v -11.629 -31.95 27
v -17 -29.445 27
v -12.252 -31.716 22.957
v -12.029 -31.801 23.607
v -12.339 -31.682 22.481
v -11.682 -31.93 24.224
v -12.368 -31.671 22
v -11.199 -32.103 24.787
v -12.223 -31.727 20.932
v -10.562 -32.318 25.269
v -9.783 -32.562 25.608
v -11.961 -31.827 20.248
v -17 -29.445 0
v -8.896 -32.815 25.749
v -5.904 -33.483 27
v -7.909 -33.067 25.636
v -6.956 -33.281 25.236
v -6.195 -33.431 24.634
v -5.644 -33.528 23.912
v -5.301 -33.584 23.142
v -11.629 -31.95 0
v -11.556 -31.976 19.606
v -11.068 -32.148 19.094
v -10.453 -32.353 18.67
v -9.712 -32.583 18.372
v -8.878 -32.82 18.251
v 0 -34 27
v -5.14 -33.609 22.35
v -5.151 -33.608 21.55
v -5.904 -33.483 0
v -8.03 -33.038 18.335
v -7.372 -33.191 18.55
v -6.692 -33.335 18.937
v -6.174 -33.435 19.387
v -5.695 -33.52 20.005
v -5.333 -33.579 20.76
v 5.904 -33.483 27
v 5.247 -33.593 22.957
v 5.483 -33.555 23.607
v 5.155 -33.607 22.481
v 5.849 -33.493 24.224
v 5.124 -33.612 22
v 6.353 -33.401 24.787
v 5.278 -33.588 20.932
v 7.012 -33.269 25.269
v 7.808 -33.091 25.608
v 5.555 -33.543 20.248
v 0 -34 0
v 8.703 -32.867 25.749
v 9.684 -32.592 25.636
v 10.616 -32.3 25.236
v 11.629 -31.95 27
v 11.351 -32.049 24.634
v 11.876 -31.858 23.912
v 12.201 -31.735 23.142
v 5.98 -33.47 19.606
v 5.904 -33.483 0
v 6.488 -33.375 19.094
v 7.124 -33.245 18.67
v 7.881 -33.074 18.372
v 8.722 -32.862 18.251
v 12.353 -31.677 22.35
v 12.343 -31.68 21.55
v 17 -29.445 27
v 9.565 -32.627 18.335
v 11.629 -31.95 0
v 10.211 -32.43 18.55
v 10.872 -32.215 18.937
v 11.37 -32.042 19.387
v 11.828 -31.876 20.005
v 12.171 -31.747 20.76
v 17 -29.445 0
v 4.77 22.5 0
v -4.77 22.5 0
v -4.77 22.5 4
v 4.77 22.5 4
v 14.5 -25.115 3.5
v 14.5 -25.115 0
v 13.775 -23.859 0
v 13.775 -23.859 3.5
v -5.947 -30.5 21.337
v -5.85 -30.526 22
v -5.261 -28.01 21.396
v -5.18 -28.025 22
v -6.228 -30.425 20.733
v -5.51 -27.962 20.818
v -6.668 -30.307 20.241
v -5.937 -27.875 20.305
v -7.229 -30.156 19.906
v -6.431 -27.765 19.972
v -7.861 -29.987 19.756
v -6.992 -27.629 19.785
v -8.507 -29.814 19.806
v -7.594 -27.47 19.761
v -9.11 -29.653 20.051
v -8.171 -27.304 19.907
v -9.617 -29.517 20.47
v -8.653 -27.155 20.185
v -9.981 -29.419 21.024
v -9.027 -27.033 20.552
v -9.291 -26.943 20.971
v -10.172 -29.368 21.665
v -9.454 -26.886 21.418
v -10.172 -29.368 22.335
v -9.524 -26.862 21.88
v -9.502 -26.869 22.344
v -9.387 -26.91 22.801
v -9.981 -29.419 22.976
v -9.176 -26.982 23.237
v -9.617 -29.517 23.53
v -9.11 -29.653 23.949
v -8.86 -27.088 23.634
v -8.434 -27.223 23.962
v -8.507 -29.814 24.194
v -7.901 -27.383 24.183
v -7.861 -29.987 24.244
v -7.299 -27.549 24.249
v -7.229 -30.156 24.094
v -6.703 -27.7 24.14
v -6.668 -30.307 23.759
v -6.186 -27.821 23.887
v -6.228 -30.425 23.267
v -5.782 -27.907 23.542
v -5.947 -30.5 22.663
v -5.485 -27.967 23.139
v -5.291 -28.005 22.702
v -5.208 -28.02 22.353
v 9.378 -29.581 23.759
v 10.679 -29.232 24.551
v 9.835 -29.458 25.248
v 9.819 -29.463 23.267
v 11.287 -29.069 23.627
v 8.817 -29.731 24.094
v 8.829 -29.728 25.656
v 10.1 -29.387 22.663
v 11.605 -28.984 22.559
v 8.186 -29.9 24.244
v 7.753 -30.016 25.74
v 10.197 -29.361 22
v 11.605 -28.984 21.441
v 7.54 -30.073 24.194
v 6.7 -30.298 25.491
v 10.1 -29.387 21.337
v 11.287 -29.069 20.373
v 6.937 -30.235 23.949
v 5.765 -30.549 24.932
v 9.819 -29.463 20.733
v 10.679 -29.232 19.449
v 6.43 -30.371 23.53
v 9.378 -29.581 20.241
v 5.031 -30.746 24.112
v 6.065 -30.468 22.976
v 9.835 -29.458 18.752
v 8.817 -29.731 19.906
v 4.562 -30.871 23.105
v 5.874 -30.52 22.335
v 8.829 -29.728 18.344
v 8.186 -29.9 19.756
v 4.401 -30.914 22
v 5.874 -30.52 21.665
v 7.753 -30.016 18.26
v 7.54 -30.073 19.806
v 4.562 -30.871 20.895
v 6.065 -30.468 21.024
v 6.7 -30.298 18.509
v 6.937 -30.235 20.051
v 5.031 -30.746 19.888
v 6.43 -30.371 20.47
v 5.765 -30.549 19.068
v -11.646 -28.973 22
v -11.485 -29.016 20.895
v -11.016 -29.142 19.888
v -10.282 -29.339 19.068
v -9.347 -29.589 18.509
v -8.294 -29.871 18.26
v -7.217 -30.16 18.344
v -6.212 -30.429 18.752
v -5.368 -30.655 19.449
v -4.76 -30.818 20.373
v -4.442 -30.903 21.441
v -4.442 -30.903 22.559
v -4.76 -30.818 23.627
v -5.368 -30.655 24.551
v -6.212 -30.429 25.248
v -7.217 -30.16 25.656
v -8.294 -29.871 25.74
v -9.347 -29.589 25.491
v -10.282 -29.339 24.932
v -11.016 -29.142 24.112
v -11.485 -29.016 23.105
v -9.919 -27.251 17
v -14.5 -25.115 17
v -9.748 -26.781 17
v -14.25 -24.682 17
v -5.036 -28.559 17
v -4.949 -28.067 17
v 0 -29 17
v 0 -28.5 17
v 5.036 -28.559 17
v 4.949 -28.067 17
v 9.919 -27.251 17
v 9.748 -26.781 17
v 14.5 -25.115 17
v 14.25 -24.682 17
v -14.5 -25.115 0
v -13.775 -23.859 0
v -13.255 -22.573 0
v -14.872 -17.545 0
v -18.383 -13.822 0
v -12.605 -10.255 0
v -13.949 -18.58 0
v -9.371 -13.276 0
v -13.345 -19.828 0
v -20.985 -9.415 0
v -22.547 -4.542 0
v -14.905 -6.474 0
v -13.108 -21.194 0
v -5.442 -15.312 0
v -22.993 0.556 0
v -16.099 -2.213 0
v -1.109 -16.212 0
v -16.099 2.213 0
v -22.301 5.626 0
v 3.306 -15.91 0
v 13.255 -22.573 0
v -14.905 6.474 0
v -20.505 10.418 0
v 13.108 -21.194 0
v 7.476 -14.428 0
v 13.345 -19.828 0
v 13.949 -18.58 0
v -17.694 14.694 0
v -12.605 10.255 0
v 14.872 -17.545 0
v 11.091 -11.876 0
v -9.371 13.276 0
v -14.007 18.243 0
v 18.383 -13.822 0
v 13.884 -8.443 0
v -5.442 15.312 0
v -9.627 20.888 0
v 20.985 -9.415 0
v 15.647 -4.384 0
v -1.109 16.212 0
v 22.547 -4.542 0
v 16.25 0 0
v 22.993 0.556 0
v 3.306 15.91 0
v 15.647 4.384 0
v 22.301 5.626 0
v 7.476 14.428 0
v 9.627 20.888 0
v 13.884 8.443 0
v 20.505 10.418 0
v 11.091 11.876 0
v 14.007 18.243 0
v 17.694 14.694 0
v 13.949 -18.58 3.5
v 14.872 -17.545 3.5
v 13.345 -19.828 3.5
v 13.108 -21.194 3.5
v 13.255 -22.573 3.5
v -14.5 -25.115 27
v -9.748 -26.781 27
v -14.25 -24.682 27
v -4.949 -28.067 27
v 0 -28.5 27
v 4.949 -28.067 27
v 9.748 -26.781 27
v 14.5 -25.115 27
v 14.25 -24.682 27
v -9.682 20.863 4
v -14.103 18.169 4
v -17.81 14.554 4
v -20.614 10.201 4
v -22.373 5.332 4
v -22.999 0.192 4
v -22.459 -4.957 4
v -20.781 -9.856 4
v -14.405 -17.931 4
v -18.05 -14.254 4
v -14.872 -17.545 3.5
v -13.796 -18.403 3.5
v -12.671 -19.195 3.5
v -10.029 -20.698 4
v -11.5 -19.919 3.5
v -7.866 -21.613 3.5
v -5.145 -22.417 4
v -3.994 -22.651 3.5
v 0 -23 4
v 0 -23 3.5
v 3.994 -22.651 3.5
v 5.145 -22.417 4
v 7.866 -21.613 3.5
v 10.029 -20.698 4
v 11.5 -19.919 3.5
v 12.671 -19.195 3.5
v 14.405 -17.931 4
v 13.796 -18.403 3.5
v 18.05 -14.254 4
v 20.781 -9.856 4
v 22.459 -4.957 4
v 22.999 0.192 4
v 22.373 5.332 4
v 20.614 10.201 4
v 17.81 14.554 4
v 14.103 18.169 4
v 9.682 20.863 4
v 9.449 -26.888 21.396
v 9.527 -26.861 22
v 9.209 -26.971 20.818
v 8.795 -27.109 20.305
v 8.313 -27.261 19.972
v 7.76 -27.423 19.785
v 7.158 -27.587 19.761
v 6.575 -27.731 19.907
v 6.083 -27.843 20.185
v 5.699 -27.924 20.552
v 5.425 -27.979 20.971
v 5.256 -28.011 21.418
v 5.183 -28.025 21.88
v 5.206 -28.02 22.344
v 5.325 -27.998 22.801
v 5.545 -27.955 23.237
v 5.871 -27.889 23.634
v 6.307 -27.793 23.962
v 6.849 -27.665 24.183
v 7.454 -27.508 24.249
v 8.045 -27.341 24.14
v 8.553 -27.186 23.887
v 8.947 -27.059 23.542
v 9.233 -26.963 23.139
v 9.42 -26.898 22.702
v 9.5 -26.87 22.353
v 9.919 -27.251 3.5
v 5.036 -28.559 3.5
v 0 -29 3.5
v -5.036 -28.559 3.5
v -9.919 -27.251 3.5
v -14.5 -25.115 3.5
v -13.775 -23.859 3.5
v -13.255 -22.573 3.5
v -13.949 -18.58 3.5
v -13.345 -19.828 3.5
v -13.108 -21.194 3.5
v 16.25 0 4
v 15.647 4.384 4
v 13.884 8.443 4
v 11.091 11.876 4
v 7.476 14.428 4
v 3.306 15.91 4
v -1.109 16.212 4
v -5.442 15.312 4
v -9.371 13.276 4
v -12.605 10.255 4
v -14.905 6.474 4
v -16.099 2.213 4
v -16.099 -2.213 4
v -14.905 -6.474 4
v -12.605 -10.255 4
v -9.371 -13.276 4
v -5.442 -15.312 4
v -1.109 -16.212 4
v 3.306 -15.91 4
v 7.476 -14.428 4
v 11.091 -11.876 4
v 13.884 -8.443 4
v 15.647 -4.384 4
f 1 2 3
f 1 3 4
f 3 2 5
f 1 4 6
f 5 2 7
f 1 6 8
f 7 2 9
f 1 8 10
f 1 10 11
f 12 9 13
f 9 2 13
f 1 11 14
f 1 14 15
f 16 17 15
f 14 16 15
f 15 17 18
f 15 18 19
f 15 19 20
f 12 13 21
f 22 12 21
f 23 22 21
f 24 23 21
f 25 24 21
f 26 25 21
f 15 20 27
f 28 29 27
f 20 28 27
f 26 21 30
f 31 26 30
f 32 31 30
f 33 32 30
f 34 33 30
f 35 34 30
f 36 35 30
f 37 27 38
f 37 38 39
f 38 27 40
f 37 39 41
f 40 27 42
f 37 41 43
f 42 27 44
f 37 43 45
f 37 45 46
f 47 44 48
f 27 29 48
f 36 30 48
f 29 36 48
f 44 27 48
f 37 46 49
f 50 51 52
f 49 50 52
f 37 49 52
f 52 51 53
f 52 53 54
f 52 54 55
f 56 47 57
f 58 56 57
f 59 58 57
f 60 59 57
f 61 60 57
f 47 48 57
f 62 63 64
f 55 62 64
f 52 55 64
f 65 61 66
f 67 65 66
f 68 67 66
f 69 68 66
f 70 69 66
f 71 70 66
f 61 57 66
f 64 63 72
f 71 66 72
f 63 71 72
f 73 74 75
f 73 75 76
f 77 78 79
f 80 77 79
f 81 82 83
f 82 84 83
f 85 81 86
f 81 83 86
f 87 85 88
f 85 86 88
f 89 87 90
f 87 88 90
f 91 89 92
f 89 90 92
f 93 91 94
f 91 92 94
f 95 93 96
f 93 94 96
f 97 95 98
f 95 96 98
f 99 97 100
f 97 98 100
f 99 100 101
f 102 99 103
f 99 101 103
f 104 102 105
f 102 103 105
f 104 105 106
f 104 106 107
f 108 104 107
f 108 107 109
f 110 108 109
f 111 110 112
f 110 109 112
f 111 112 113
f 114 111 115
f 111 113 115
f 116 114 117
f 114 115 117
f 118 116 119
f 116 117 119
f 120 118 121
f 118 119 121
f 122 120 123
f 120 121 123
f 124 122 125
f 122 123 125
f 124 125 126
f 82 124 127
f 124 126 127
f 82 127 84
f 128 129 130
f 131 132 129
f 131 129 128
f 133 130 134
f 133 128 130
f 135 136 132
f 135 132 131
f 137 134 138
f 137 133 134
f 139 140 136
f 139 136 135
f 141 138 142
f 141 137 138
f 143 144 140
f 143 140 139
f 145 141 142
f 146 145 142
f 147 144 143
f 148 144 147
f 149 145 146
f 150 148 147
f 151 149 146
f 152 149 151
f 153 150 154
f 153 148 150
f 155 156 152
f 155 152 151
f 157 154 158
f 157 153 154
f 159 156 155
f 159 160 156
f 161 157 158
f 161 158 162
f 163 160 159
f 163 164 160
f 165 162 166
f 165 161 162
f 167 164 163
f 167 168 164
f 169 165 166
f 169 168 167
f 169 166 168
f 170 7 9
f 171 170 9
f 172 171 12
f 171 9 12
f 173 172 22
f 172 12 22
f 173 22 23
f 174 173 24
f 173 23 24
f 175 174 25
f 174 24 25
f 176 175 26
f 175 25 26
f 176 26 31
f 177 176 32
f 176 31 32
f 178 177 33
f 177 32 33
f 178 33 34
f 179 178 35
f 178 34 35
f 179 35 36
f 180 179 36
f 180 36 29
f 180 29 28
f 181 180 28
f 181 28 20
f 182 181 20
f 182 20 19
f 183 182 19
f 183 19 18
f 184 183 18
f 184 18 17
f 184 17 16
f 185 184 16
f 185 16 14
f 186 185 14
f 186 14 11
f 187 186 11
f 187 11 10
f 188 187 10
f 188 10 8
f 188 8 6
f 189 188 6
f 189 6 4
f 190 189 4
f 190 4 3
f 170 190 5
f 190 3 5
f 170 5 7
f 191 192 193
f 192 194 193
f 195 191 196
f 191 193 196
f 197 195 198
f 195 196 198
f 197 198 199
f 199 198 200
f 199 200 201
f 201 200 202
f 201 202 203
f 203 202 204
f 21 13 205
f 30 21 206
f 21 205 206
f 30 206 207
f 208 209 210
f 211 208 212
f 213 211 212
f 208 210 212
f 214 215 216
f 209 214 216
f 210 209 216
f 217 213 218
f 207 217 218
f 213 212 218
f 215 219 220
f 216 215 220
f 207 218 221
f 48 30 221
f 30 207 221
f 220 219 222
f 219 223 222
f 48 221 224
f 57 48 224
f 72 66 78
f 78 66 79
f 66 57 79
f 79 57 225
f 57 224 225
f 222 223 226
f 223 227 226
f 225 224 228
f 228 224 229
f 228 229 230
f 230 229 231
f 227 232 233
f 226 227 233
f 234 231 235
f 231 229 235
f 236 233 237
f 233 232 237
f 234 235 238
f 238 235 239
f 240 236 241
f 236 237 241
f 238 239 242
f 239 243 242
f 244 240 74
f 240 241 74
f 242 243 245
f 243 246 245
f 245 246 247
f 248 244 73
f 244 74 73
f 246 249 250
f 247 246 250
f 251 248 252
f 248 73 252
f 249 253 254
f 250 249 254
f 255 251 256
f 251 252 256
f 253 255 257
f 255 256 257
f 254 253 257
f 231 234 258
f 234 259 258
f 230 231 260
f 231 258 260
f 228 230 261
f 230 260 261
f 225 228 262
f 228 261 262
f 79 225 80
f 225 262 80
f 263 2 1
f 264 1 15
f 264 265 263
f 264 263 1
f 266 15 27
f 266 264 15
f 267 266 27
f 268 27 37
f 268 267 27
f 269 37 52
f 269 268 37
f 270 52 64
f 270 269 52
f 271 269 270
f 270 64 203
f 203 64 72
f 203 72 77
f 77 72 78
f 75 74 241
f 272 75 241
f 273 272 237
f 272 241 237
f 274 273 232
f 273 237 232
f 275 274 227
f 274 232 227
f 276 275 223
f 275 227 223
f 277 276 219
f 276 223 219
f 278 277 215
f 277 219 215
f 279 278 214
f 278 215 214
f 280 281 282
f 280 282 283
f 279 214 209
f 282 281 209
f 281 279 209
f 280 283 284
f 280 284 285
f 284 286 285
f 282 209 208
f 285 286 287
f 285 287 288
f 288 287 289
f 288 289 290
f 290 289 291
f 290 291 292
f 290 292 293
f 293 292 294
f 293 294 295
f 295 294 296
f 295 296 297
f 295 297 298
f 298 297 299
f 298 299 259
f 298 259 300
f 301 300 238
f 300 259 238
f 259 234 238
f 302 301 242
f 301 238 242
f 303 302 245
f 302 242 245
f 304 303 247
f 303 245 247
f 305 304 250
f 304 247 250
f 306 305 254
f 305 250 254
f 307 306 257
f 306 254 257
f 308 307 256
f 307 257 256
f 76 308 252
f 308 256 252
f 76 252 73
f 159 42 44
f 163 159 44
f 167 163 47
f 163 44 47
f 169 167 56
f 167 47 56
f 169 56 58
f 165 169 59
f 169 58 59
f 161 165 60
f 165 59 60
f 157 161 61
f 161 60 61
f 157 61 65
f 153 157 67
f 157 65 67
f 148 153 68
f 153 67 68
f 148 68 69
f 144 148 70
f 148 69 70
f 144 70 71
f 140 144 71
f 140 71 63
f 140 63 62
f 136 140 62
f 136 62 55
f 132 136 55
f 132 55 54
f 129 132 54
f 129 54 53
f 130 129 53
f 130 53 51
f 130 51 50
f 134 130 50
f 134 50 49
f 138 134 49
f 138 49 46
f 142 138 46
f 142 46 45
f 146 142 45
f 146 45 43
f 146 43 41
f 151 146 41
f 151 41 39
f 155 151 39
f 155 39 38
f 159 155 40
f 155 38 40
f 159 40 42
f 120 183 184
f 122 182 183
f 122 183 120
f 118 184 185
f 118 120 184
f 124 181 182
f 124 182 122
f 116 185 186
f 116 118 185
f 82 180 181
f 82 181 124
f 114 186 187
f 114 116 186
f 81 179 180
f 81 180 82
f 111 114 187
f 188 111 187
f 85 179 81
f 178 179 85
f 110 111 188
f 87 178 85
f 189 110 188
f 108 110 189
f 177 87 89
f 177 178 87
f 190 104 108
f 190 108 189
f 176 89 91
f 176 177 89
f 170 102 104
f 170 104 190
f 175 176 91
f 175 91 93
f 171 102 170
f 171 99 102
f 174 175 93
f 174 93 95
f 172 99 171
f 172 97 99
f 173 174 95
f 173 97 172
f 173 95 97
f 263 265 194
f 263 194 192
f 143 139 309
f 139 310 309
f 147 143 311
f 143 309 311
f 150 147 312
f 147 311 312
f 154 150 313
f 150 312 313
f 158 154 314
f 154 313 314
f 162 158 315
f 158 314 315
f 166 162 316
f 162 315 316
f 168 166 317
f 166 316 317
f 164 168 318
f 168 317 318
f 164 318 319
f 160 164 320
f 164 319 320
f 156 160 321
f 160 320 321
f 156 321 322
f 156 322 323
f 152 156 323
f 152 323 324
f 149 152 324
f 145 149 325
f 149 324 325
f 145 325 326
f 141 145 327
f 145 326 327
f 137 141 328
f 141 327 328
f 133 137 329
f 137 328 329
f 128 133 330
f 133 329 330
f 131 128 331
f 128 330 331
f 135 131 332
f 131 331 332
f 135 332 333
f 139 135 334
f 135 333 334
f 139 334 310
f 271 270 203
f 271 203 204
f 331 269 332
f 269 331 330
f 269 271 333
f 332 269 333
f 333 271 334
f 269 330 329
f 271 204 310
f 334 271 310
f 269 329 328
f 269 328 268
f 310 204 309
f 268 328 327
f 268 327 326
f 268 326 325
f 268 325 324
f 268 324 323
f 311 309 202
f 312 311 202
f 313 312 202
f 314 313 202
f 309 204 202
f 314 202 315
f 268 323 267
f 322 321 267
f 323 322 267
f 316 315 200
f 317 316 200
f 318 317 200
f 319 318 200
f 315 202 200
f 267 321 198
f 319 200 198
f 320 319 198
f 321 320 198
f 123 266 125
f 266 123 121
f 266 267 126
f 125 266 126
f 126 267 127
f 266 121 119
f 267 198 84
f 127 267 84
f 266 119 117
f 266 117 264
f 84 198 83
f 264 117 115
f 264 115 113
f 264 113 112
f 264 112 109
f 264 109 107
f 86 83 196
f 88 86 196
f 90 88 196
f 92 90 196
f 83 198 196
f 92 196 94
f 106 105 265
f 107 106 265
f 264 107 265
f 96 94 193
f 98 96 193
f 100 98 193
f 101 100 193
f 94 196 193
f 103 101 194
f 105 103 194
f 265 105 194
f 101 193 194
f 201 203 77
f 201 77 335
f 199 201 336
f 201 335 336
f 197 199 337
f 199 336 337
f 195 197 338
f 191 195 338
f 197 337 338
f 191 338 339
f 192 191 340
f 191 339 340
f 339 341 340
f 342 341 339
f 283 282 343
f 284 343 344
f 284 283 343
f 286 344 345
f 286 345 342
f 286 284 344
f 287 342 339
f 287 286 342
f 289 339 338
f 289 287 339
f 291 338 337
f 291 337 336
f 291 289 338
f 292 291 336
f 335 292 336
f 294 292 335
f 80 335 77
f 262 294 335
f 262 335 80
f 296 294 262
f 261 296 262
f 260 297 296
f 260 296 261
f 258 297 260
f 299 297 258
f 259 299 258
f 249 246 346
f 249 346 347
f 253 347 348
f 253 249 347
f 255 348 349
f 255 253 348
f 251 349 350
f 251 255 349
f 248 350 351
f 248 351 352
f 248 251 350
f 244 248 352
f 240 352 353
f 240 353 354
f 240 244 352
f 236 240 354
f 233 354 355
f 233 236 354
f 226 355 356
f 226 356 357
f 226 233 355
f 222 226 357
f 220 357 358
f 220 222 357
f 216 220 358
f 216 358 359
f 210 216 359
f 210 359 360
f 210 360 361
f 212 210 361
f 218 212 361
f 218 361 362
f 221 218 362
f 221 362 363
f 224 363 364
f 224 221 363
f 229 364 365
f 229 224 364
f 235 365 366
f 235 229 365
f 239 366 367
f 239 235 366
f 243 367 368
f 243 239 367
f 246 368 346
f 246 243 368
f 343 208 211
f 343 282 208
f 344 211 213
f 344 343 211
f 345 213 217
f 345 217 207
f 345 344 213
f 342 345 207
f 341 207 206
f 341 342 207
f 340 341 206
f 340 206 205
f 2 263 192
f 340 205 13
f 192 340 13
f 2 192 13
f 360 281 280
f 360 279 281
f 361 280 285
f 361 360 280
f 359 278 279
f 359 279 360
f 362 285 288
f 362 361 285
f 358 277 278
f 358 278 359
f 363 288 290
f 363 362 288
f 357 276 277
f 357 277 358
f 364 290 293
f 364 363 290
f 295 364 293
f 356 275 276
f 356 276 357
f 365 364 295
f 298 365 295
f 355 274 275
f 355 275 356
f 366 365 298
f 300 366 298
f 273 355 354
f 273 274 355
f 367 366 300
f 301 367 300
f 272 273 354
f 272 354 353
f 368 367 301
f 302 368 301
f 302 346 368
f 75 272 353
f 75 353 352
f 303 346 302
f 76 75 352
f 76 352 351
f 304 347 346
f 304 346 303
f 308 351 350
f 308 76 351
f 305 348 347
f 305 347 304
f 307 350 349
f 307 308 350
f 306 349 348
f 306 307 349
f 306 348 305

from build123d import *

# Parameters (mm, degrees)
SKETCH_1_R                          = 23
SKETCH_1_R_2                        = 16.25
EXTRUDE_1_DEPTH                     = 4
SKETCH_2_W                          = 9.539392014
SKETCH_2_H                          = 6.996470021
CUT_EXTRUDE_1_DEPTH                 = 14
EXTRUDE_2_DEPTH                     = 3.5
EXTRUDE_3_DEPTH                     = 27
FILLET_1_R                          = 5
EXTRUDE_START                       = -10
EXTRUDE_4_DEPTH                     = 10
HOLE_WIZARD_1_D                     = 4.5
HOLE_WIZARD_1_CBORE_D               = 7.5
HOLE_WIZARD_1_CBORE_DEPTH           = 3
HOLE_WIZARD_1_ON_FACE_2_D           = 4.5
HOLE_WIZARD_1_ON_FACE_2_CBORE_D     = 7.5
HOLE_WIZARD_1_ON_FACE_2_CBORE_DEPTH = 3


with BuildPart() as part:
    # 草图1 → 凸台-拉伸1 (new body)
    with BuildSketch(Plane.XY):
        Circle(SKETCH_1_R)
        Circle(SKETCH_1_R_2, mode=Mode.SUBTRACT)
    extrude(amount=EXTRUDE_1_DEPTH)

    # 草图2 → 切除-拉伸1 (cut)
    with BuildSketch(Plane.XY):
        with Locations((0, 25.998235011)):
            Rectangle(SKETCH_2_W, SKETCH_2_H)
    extrude(amount=CUT_EXTRUDE_1_DEPTH, mode=Mode.SUBTRACT)

    # 草图3 → 凸台-拉伸2 (add)
    with BuildSketch(Plane.XY):
        with BuildLine():
            Line((-11.5, -19.918584287), (-14.5, -25.11473671))
            ThreePointArc((-14.5, -25.11473671), (0, -29), (14.5, -25.11473671))
            Line((14.5, -25.11473671), (11.5, -19.918584287))
            ThreePointArc((11.5, -19.918584287), (0, -23), (-11.5, -19.918584287))
        make_face()
    extrude(amount=EXTRUDE_2_DEPTH)

    # 草图3<3> → 凸台-拉伸3 (add)
    with BuildSketch(Plane.XY):
        with BuildLine():
            ThreePointArc((14.5, -25.11473671), (0, -29), (-14.5, -25.11473671))
            Line((-14.5, -25.11473671), (-17, -29.444863729))
            ThreePointArc((-17, -29.444863729), (0, -34), (17, -29.444863729))
            Line((17, -29.444863729), (14.5, -25.11473671))
        make_face()
    extrude(amount=EXTRUDE_3_DEPTH)

    # 圆角1
    fillet_1_edges = [part.edges().sort_by_distance(p)[0] for p in [
        (-11.5, -19.918584287, 1.75),
        (11.5, -19.918584287, 1.75),
    ]]
    fillet(fillet_1_edges, radius=FILLET_1_R)

    # 草图4 → 凸台-拉伸4 (add)
    with BuildSketch(Plane.XY.offset(27).offset(EXTRUDE_START)):
        with BuildLine():
            ThreePointArc((-17, -29.444863729), (0, -34), (17, -29.444863729))
            Line((17, -29.444863729), (14.25, -24.681724008))
            ThreePointArc((14.25, -24.681724008), (0, -28.5), (-14.25, -24.681724008))
            Line((-14.25, -24.681724008), (-17, -29.444863729))
        make_face()
    extrude(amount=EXTRUDE_4_DEPTH)

    # 孔1 (through all)
    with Locations(Plane(origin=(-8.799847533, -32.841478094, 22), x_dir=(-0.965925826289, 0.258819045103, 0), z_dir=(-0.258819045103, -0.965925826289, 0))):
        with Locations((1e-09, 0)):
            CounterBoreHole(HOLE_WIZARD_1_D / 2, HOLE_WIZARD_1_CBORE_D / 2, HOLE_WIZARD_1_CBORE_DEPTH)

    # 孔1 on face 2 (through all)
    with Locations(Plane(origin=(8.799847533, -32.841478094, 22), x_dir=(-0.965925849201, -0.258818959594, 0), z_dir=(0.258818959594, -0.965925849201, 0))):
        with Locations((-1e-09, 0)):
            CounterBoreHole(HOLE_WIZARD_1_ON_FACE_2_D / 2, HOLE_WIZARD_1_ON_FACE_2_CBORE_D / 2, HOLE_WIZARD_1_ON_FACE_2_CBORE_DEPTH)


solid = part.part
